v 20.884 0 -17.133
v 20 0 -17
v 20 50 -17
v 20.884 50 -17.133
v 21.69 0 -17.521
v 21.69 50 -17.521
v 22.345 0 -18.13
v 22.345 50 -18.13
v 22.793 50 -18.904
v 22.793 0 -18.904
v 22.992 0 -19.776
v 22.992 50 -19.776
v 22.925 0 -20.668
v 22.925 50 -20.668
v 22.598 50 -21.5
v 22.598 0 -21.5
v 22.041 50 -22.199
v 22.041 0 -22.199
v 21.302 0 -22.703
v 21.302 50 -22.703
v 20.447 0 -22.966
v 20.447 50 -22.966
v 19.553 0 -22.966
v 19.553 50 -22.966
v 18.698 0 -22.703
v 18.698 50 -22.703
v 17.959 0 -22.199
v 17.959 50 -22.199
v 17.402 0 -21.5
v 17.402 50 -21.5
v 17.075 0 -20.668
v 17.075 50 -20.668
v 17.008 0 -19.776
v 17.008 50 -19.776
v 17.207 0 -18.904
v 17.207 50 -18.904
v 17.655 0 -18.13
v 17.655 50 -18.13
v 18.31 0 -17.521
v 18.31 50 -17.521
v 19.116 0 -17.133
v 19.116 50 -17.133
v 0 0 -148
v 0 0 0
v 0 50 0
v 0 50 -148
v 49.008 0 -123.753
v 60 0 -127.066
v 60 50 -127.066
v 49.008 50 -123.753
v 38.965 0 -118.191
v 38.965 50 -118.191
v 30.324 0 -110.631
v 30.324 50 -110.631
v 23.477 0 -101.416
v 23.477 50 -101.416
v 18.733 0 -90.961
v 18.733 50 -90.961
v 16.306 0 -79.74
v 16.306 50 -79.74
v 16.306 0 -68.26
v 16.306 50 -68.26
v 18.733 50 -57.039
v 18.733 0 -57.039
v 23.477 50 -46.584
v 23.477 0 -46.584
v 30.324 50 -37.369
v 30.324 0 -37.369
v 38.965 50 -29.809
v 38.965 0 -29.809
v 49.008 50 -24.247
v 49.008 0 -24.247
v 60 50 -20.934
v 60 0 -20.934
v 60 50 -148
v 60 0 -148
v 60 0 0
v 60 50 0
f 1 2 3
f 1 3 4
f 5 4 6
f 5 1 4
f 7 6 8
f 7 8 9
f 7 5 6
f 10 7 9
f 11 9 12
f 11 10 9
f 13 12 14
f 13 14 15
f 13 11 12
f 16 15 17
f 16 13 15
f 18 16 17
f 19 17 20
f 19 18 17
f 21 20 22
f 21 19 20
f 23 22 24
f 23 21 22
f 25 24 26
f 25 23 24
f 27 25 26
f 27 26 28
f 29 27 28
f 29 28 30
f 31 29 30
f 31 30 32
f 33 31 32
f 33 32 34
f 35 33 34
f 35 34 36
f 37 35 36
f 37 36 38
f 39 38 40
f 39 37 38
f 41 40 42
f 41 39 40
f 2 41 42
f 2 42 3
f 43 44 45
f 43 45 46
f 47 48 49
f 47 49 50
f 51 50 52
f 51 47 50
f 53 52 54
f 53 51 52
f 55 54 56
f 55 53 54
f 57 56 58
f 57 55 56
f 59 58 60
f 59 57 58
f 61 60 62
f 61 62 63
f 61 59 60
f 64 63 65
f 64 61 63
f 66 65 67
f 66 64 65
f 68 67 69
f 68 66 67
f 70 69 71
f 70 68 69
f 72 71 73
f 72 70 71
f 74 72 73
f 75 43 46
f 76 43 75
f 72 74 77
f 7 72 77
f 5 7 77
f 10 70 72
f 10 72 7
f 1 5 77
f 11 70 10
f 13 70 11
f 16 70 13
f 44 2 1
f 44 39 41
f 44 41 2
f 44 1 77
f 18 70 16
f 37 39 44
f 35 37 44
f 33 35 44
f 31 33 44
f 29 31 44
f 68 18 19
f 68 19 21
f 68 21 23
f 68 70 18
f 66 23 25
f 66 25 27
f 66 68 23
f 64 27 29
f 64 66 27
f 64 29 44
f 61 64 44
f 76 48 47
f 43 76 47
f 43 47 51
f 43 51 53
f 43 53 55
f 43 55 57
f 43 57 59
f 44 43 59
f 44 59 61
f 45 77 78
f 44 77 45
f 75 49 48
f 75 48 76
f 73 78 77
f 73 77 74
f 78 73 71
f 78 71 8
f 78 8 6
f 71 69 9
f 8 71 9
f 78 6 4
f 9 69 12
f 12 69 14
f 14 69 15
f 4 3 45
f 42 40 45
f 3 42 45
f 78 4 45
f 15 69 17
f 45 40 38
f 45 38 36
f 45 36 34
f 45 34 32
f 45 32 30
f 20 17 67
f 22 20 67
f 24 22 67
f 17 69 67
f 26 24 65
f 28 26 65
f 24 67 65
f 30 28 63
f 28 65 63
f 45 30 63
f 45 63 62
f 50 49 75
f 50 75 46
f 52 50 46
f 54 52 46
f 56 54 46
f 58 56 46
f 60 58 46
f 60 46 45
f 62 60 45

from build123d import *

# Parameters (mm, degrees)
SKETCH1_R           = 3
BOSS_EXTRUDE1_DEPTH = 50
SKETCH2_W           = 10
SKETCH2_H           = 148
CUT_EXTRUDE1_DEPTH  = 172.184111412


with BuildPart() as part:
    # Sketch1 → Boss-Extrude1 (new body)
    with BuildSketch(Plane(origin=(0, 0, 0), x_dir=(1, 0, 0), z_dir=(0, 1, 0))):
        with BuildLine():
            Line((0, 0), (0, 148))
            Line((0, 148), (70, 148))
            Line((70, 148), (70, 128))
            ThreePointArc((70, 128), (16, 74), (70, 20))
            Line((70, 20), (70, 0))
            Line((70, 0), (0, 0))
        make_face()
        with Locations(Location((20, 20, 0), (0, 0, 270))):
            Circle(SKETCH1_R, mode=Mode.SUBTRACT)
    extrude(amount=BOSS_EXTRUDE1_DEPTH)

    # Sketch2 → Cut-Extrude1 (cut, through all)
    with BuildSketch(Plane(origin=(0, 50, 0), x_dir=(1, 0, 0), z_dir=(0, 1, 0))):
        with Locations((65, 74)):
            Rectangle(SKETCH2_W, SKETCH2_H)
    extrude(amount=-CUT_EXTRUDE1_DEPTH, mode=Mode.SUBTRACT)


solid = part.part
